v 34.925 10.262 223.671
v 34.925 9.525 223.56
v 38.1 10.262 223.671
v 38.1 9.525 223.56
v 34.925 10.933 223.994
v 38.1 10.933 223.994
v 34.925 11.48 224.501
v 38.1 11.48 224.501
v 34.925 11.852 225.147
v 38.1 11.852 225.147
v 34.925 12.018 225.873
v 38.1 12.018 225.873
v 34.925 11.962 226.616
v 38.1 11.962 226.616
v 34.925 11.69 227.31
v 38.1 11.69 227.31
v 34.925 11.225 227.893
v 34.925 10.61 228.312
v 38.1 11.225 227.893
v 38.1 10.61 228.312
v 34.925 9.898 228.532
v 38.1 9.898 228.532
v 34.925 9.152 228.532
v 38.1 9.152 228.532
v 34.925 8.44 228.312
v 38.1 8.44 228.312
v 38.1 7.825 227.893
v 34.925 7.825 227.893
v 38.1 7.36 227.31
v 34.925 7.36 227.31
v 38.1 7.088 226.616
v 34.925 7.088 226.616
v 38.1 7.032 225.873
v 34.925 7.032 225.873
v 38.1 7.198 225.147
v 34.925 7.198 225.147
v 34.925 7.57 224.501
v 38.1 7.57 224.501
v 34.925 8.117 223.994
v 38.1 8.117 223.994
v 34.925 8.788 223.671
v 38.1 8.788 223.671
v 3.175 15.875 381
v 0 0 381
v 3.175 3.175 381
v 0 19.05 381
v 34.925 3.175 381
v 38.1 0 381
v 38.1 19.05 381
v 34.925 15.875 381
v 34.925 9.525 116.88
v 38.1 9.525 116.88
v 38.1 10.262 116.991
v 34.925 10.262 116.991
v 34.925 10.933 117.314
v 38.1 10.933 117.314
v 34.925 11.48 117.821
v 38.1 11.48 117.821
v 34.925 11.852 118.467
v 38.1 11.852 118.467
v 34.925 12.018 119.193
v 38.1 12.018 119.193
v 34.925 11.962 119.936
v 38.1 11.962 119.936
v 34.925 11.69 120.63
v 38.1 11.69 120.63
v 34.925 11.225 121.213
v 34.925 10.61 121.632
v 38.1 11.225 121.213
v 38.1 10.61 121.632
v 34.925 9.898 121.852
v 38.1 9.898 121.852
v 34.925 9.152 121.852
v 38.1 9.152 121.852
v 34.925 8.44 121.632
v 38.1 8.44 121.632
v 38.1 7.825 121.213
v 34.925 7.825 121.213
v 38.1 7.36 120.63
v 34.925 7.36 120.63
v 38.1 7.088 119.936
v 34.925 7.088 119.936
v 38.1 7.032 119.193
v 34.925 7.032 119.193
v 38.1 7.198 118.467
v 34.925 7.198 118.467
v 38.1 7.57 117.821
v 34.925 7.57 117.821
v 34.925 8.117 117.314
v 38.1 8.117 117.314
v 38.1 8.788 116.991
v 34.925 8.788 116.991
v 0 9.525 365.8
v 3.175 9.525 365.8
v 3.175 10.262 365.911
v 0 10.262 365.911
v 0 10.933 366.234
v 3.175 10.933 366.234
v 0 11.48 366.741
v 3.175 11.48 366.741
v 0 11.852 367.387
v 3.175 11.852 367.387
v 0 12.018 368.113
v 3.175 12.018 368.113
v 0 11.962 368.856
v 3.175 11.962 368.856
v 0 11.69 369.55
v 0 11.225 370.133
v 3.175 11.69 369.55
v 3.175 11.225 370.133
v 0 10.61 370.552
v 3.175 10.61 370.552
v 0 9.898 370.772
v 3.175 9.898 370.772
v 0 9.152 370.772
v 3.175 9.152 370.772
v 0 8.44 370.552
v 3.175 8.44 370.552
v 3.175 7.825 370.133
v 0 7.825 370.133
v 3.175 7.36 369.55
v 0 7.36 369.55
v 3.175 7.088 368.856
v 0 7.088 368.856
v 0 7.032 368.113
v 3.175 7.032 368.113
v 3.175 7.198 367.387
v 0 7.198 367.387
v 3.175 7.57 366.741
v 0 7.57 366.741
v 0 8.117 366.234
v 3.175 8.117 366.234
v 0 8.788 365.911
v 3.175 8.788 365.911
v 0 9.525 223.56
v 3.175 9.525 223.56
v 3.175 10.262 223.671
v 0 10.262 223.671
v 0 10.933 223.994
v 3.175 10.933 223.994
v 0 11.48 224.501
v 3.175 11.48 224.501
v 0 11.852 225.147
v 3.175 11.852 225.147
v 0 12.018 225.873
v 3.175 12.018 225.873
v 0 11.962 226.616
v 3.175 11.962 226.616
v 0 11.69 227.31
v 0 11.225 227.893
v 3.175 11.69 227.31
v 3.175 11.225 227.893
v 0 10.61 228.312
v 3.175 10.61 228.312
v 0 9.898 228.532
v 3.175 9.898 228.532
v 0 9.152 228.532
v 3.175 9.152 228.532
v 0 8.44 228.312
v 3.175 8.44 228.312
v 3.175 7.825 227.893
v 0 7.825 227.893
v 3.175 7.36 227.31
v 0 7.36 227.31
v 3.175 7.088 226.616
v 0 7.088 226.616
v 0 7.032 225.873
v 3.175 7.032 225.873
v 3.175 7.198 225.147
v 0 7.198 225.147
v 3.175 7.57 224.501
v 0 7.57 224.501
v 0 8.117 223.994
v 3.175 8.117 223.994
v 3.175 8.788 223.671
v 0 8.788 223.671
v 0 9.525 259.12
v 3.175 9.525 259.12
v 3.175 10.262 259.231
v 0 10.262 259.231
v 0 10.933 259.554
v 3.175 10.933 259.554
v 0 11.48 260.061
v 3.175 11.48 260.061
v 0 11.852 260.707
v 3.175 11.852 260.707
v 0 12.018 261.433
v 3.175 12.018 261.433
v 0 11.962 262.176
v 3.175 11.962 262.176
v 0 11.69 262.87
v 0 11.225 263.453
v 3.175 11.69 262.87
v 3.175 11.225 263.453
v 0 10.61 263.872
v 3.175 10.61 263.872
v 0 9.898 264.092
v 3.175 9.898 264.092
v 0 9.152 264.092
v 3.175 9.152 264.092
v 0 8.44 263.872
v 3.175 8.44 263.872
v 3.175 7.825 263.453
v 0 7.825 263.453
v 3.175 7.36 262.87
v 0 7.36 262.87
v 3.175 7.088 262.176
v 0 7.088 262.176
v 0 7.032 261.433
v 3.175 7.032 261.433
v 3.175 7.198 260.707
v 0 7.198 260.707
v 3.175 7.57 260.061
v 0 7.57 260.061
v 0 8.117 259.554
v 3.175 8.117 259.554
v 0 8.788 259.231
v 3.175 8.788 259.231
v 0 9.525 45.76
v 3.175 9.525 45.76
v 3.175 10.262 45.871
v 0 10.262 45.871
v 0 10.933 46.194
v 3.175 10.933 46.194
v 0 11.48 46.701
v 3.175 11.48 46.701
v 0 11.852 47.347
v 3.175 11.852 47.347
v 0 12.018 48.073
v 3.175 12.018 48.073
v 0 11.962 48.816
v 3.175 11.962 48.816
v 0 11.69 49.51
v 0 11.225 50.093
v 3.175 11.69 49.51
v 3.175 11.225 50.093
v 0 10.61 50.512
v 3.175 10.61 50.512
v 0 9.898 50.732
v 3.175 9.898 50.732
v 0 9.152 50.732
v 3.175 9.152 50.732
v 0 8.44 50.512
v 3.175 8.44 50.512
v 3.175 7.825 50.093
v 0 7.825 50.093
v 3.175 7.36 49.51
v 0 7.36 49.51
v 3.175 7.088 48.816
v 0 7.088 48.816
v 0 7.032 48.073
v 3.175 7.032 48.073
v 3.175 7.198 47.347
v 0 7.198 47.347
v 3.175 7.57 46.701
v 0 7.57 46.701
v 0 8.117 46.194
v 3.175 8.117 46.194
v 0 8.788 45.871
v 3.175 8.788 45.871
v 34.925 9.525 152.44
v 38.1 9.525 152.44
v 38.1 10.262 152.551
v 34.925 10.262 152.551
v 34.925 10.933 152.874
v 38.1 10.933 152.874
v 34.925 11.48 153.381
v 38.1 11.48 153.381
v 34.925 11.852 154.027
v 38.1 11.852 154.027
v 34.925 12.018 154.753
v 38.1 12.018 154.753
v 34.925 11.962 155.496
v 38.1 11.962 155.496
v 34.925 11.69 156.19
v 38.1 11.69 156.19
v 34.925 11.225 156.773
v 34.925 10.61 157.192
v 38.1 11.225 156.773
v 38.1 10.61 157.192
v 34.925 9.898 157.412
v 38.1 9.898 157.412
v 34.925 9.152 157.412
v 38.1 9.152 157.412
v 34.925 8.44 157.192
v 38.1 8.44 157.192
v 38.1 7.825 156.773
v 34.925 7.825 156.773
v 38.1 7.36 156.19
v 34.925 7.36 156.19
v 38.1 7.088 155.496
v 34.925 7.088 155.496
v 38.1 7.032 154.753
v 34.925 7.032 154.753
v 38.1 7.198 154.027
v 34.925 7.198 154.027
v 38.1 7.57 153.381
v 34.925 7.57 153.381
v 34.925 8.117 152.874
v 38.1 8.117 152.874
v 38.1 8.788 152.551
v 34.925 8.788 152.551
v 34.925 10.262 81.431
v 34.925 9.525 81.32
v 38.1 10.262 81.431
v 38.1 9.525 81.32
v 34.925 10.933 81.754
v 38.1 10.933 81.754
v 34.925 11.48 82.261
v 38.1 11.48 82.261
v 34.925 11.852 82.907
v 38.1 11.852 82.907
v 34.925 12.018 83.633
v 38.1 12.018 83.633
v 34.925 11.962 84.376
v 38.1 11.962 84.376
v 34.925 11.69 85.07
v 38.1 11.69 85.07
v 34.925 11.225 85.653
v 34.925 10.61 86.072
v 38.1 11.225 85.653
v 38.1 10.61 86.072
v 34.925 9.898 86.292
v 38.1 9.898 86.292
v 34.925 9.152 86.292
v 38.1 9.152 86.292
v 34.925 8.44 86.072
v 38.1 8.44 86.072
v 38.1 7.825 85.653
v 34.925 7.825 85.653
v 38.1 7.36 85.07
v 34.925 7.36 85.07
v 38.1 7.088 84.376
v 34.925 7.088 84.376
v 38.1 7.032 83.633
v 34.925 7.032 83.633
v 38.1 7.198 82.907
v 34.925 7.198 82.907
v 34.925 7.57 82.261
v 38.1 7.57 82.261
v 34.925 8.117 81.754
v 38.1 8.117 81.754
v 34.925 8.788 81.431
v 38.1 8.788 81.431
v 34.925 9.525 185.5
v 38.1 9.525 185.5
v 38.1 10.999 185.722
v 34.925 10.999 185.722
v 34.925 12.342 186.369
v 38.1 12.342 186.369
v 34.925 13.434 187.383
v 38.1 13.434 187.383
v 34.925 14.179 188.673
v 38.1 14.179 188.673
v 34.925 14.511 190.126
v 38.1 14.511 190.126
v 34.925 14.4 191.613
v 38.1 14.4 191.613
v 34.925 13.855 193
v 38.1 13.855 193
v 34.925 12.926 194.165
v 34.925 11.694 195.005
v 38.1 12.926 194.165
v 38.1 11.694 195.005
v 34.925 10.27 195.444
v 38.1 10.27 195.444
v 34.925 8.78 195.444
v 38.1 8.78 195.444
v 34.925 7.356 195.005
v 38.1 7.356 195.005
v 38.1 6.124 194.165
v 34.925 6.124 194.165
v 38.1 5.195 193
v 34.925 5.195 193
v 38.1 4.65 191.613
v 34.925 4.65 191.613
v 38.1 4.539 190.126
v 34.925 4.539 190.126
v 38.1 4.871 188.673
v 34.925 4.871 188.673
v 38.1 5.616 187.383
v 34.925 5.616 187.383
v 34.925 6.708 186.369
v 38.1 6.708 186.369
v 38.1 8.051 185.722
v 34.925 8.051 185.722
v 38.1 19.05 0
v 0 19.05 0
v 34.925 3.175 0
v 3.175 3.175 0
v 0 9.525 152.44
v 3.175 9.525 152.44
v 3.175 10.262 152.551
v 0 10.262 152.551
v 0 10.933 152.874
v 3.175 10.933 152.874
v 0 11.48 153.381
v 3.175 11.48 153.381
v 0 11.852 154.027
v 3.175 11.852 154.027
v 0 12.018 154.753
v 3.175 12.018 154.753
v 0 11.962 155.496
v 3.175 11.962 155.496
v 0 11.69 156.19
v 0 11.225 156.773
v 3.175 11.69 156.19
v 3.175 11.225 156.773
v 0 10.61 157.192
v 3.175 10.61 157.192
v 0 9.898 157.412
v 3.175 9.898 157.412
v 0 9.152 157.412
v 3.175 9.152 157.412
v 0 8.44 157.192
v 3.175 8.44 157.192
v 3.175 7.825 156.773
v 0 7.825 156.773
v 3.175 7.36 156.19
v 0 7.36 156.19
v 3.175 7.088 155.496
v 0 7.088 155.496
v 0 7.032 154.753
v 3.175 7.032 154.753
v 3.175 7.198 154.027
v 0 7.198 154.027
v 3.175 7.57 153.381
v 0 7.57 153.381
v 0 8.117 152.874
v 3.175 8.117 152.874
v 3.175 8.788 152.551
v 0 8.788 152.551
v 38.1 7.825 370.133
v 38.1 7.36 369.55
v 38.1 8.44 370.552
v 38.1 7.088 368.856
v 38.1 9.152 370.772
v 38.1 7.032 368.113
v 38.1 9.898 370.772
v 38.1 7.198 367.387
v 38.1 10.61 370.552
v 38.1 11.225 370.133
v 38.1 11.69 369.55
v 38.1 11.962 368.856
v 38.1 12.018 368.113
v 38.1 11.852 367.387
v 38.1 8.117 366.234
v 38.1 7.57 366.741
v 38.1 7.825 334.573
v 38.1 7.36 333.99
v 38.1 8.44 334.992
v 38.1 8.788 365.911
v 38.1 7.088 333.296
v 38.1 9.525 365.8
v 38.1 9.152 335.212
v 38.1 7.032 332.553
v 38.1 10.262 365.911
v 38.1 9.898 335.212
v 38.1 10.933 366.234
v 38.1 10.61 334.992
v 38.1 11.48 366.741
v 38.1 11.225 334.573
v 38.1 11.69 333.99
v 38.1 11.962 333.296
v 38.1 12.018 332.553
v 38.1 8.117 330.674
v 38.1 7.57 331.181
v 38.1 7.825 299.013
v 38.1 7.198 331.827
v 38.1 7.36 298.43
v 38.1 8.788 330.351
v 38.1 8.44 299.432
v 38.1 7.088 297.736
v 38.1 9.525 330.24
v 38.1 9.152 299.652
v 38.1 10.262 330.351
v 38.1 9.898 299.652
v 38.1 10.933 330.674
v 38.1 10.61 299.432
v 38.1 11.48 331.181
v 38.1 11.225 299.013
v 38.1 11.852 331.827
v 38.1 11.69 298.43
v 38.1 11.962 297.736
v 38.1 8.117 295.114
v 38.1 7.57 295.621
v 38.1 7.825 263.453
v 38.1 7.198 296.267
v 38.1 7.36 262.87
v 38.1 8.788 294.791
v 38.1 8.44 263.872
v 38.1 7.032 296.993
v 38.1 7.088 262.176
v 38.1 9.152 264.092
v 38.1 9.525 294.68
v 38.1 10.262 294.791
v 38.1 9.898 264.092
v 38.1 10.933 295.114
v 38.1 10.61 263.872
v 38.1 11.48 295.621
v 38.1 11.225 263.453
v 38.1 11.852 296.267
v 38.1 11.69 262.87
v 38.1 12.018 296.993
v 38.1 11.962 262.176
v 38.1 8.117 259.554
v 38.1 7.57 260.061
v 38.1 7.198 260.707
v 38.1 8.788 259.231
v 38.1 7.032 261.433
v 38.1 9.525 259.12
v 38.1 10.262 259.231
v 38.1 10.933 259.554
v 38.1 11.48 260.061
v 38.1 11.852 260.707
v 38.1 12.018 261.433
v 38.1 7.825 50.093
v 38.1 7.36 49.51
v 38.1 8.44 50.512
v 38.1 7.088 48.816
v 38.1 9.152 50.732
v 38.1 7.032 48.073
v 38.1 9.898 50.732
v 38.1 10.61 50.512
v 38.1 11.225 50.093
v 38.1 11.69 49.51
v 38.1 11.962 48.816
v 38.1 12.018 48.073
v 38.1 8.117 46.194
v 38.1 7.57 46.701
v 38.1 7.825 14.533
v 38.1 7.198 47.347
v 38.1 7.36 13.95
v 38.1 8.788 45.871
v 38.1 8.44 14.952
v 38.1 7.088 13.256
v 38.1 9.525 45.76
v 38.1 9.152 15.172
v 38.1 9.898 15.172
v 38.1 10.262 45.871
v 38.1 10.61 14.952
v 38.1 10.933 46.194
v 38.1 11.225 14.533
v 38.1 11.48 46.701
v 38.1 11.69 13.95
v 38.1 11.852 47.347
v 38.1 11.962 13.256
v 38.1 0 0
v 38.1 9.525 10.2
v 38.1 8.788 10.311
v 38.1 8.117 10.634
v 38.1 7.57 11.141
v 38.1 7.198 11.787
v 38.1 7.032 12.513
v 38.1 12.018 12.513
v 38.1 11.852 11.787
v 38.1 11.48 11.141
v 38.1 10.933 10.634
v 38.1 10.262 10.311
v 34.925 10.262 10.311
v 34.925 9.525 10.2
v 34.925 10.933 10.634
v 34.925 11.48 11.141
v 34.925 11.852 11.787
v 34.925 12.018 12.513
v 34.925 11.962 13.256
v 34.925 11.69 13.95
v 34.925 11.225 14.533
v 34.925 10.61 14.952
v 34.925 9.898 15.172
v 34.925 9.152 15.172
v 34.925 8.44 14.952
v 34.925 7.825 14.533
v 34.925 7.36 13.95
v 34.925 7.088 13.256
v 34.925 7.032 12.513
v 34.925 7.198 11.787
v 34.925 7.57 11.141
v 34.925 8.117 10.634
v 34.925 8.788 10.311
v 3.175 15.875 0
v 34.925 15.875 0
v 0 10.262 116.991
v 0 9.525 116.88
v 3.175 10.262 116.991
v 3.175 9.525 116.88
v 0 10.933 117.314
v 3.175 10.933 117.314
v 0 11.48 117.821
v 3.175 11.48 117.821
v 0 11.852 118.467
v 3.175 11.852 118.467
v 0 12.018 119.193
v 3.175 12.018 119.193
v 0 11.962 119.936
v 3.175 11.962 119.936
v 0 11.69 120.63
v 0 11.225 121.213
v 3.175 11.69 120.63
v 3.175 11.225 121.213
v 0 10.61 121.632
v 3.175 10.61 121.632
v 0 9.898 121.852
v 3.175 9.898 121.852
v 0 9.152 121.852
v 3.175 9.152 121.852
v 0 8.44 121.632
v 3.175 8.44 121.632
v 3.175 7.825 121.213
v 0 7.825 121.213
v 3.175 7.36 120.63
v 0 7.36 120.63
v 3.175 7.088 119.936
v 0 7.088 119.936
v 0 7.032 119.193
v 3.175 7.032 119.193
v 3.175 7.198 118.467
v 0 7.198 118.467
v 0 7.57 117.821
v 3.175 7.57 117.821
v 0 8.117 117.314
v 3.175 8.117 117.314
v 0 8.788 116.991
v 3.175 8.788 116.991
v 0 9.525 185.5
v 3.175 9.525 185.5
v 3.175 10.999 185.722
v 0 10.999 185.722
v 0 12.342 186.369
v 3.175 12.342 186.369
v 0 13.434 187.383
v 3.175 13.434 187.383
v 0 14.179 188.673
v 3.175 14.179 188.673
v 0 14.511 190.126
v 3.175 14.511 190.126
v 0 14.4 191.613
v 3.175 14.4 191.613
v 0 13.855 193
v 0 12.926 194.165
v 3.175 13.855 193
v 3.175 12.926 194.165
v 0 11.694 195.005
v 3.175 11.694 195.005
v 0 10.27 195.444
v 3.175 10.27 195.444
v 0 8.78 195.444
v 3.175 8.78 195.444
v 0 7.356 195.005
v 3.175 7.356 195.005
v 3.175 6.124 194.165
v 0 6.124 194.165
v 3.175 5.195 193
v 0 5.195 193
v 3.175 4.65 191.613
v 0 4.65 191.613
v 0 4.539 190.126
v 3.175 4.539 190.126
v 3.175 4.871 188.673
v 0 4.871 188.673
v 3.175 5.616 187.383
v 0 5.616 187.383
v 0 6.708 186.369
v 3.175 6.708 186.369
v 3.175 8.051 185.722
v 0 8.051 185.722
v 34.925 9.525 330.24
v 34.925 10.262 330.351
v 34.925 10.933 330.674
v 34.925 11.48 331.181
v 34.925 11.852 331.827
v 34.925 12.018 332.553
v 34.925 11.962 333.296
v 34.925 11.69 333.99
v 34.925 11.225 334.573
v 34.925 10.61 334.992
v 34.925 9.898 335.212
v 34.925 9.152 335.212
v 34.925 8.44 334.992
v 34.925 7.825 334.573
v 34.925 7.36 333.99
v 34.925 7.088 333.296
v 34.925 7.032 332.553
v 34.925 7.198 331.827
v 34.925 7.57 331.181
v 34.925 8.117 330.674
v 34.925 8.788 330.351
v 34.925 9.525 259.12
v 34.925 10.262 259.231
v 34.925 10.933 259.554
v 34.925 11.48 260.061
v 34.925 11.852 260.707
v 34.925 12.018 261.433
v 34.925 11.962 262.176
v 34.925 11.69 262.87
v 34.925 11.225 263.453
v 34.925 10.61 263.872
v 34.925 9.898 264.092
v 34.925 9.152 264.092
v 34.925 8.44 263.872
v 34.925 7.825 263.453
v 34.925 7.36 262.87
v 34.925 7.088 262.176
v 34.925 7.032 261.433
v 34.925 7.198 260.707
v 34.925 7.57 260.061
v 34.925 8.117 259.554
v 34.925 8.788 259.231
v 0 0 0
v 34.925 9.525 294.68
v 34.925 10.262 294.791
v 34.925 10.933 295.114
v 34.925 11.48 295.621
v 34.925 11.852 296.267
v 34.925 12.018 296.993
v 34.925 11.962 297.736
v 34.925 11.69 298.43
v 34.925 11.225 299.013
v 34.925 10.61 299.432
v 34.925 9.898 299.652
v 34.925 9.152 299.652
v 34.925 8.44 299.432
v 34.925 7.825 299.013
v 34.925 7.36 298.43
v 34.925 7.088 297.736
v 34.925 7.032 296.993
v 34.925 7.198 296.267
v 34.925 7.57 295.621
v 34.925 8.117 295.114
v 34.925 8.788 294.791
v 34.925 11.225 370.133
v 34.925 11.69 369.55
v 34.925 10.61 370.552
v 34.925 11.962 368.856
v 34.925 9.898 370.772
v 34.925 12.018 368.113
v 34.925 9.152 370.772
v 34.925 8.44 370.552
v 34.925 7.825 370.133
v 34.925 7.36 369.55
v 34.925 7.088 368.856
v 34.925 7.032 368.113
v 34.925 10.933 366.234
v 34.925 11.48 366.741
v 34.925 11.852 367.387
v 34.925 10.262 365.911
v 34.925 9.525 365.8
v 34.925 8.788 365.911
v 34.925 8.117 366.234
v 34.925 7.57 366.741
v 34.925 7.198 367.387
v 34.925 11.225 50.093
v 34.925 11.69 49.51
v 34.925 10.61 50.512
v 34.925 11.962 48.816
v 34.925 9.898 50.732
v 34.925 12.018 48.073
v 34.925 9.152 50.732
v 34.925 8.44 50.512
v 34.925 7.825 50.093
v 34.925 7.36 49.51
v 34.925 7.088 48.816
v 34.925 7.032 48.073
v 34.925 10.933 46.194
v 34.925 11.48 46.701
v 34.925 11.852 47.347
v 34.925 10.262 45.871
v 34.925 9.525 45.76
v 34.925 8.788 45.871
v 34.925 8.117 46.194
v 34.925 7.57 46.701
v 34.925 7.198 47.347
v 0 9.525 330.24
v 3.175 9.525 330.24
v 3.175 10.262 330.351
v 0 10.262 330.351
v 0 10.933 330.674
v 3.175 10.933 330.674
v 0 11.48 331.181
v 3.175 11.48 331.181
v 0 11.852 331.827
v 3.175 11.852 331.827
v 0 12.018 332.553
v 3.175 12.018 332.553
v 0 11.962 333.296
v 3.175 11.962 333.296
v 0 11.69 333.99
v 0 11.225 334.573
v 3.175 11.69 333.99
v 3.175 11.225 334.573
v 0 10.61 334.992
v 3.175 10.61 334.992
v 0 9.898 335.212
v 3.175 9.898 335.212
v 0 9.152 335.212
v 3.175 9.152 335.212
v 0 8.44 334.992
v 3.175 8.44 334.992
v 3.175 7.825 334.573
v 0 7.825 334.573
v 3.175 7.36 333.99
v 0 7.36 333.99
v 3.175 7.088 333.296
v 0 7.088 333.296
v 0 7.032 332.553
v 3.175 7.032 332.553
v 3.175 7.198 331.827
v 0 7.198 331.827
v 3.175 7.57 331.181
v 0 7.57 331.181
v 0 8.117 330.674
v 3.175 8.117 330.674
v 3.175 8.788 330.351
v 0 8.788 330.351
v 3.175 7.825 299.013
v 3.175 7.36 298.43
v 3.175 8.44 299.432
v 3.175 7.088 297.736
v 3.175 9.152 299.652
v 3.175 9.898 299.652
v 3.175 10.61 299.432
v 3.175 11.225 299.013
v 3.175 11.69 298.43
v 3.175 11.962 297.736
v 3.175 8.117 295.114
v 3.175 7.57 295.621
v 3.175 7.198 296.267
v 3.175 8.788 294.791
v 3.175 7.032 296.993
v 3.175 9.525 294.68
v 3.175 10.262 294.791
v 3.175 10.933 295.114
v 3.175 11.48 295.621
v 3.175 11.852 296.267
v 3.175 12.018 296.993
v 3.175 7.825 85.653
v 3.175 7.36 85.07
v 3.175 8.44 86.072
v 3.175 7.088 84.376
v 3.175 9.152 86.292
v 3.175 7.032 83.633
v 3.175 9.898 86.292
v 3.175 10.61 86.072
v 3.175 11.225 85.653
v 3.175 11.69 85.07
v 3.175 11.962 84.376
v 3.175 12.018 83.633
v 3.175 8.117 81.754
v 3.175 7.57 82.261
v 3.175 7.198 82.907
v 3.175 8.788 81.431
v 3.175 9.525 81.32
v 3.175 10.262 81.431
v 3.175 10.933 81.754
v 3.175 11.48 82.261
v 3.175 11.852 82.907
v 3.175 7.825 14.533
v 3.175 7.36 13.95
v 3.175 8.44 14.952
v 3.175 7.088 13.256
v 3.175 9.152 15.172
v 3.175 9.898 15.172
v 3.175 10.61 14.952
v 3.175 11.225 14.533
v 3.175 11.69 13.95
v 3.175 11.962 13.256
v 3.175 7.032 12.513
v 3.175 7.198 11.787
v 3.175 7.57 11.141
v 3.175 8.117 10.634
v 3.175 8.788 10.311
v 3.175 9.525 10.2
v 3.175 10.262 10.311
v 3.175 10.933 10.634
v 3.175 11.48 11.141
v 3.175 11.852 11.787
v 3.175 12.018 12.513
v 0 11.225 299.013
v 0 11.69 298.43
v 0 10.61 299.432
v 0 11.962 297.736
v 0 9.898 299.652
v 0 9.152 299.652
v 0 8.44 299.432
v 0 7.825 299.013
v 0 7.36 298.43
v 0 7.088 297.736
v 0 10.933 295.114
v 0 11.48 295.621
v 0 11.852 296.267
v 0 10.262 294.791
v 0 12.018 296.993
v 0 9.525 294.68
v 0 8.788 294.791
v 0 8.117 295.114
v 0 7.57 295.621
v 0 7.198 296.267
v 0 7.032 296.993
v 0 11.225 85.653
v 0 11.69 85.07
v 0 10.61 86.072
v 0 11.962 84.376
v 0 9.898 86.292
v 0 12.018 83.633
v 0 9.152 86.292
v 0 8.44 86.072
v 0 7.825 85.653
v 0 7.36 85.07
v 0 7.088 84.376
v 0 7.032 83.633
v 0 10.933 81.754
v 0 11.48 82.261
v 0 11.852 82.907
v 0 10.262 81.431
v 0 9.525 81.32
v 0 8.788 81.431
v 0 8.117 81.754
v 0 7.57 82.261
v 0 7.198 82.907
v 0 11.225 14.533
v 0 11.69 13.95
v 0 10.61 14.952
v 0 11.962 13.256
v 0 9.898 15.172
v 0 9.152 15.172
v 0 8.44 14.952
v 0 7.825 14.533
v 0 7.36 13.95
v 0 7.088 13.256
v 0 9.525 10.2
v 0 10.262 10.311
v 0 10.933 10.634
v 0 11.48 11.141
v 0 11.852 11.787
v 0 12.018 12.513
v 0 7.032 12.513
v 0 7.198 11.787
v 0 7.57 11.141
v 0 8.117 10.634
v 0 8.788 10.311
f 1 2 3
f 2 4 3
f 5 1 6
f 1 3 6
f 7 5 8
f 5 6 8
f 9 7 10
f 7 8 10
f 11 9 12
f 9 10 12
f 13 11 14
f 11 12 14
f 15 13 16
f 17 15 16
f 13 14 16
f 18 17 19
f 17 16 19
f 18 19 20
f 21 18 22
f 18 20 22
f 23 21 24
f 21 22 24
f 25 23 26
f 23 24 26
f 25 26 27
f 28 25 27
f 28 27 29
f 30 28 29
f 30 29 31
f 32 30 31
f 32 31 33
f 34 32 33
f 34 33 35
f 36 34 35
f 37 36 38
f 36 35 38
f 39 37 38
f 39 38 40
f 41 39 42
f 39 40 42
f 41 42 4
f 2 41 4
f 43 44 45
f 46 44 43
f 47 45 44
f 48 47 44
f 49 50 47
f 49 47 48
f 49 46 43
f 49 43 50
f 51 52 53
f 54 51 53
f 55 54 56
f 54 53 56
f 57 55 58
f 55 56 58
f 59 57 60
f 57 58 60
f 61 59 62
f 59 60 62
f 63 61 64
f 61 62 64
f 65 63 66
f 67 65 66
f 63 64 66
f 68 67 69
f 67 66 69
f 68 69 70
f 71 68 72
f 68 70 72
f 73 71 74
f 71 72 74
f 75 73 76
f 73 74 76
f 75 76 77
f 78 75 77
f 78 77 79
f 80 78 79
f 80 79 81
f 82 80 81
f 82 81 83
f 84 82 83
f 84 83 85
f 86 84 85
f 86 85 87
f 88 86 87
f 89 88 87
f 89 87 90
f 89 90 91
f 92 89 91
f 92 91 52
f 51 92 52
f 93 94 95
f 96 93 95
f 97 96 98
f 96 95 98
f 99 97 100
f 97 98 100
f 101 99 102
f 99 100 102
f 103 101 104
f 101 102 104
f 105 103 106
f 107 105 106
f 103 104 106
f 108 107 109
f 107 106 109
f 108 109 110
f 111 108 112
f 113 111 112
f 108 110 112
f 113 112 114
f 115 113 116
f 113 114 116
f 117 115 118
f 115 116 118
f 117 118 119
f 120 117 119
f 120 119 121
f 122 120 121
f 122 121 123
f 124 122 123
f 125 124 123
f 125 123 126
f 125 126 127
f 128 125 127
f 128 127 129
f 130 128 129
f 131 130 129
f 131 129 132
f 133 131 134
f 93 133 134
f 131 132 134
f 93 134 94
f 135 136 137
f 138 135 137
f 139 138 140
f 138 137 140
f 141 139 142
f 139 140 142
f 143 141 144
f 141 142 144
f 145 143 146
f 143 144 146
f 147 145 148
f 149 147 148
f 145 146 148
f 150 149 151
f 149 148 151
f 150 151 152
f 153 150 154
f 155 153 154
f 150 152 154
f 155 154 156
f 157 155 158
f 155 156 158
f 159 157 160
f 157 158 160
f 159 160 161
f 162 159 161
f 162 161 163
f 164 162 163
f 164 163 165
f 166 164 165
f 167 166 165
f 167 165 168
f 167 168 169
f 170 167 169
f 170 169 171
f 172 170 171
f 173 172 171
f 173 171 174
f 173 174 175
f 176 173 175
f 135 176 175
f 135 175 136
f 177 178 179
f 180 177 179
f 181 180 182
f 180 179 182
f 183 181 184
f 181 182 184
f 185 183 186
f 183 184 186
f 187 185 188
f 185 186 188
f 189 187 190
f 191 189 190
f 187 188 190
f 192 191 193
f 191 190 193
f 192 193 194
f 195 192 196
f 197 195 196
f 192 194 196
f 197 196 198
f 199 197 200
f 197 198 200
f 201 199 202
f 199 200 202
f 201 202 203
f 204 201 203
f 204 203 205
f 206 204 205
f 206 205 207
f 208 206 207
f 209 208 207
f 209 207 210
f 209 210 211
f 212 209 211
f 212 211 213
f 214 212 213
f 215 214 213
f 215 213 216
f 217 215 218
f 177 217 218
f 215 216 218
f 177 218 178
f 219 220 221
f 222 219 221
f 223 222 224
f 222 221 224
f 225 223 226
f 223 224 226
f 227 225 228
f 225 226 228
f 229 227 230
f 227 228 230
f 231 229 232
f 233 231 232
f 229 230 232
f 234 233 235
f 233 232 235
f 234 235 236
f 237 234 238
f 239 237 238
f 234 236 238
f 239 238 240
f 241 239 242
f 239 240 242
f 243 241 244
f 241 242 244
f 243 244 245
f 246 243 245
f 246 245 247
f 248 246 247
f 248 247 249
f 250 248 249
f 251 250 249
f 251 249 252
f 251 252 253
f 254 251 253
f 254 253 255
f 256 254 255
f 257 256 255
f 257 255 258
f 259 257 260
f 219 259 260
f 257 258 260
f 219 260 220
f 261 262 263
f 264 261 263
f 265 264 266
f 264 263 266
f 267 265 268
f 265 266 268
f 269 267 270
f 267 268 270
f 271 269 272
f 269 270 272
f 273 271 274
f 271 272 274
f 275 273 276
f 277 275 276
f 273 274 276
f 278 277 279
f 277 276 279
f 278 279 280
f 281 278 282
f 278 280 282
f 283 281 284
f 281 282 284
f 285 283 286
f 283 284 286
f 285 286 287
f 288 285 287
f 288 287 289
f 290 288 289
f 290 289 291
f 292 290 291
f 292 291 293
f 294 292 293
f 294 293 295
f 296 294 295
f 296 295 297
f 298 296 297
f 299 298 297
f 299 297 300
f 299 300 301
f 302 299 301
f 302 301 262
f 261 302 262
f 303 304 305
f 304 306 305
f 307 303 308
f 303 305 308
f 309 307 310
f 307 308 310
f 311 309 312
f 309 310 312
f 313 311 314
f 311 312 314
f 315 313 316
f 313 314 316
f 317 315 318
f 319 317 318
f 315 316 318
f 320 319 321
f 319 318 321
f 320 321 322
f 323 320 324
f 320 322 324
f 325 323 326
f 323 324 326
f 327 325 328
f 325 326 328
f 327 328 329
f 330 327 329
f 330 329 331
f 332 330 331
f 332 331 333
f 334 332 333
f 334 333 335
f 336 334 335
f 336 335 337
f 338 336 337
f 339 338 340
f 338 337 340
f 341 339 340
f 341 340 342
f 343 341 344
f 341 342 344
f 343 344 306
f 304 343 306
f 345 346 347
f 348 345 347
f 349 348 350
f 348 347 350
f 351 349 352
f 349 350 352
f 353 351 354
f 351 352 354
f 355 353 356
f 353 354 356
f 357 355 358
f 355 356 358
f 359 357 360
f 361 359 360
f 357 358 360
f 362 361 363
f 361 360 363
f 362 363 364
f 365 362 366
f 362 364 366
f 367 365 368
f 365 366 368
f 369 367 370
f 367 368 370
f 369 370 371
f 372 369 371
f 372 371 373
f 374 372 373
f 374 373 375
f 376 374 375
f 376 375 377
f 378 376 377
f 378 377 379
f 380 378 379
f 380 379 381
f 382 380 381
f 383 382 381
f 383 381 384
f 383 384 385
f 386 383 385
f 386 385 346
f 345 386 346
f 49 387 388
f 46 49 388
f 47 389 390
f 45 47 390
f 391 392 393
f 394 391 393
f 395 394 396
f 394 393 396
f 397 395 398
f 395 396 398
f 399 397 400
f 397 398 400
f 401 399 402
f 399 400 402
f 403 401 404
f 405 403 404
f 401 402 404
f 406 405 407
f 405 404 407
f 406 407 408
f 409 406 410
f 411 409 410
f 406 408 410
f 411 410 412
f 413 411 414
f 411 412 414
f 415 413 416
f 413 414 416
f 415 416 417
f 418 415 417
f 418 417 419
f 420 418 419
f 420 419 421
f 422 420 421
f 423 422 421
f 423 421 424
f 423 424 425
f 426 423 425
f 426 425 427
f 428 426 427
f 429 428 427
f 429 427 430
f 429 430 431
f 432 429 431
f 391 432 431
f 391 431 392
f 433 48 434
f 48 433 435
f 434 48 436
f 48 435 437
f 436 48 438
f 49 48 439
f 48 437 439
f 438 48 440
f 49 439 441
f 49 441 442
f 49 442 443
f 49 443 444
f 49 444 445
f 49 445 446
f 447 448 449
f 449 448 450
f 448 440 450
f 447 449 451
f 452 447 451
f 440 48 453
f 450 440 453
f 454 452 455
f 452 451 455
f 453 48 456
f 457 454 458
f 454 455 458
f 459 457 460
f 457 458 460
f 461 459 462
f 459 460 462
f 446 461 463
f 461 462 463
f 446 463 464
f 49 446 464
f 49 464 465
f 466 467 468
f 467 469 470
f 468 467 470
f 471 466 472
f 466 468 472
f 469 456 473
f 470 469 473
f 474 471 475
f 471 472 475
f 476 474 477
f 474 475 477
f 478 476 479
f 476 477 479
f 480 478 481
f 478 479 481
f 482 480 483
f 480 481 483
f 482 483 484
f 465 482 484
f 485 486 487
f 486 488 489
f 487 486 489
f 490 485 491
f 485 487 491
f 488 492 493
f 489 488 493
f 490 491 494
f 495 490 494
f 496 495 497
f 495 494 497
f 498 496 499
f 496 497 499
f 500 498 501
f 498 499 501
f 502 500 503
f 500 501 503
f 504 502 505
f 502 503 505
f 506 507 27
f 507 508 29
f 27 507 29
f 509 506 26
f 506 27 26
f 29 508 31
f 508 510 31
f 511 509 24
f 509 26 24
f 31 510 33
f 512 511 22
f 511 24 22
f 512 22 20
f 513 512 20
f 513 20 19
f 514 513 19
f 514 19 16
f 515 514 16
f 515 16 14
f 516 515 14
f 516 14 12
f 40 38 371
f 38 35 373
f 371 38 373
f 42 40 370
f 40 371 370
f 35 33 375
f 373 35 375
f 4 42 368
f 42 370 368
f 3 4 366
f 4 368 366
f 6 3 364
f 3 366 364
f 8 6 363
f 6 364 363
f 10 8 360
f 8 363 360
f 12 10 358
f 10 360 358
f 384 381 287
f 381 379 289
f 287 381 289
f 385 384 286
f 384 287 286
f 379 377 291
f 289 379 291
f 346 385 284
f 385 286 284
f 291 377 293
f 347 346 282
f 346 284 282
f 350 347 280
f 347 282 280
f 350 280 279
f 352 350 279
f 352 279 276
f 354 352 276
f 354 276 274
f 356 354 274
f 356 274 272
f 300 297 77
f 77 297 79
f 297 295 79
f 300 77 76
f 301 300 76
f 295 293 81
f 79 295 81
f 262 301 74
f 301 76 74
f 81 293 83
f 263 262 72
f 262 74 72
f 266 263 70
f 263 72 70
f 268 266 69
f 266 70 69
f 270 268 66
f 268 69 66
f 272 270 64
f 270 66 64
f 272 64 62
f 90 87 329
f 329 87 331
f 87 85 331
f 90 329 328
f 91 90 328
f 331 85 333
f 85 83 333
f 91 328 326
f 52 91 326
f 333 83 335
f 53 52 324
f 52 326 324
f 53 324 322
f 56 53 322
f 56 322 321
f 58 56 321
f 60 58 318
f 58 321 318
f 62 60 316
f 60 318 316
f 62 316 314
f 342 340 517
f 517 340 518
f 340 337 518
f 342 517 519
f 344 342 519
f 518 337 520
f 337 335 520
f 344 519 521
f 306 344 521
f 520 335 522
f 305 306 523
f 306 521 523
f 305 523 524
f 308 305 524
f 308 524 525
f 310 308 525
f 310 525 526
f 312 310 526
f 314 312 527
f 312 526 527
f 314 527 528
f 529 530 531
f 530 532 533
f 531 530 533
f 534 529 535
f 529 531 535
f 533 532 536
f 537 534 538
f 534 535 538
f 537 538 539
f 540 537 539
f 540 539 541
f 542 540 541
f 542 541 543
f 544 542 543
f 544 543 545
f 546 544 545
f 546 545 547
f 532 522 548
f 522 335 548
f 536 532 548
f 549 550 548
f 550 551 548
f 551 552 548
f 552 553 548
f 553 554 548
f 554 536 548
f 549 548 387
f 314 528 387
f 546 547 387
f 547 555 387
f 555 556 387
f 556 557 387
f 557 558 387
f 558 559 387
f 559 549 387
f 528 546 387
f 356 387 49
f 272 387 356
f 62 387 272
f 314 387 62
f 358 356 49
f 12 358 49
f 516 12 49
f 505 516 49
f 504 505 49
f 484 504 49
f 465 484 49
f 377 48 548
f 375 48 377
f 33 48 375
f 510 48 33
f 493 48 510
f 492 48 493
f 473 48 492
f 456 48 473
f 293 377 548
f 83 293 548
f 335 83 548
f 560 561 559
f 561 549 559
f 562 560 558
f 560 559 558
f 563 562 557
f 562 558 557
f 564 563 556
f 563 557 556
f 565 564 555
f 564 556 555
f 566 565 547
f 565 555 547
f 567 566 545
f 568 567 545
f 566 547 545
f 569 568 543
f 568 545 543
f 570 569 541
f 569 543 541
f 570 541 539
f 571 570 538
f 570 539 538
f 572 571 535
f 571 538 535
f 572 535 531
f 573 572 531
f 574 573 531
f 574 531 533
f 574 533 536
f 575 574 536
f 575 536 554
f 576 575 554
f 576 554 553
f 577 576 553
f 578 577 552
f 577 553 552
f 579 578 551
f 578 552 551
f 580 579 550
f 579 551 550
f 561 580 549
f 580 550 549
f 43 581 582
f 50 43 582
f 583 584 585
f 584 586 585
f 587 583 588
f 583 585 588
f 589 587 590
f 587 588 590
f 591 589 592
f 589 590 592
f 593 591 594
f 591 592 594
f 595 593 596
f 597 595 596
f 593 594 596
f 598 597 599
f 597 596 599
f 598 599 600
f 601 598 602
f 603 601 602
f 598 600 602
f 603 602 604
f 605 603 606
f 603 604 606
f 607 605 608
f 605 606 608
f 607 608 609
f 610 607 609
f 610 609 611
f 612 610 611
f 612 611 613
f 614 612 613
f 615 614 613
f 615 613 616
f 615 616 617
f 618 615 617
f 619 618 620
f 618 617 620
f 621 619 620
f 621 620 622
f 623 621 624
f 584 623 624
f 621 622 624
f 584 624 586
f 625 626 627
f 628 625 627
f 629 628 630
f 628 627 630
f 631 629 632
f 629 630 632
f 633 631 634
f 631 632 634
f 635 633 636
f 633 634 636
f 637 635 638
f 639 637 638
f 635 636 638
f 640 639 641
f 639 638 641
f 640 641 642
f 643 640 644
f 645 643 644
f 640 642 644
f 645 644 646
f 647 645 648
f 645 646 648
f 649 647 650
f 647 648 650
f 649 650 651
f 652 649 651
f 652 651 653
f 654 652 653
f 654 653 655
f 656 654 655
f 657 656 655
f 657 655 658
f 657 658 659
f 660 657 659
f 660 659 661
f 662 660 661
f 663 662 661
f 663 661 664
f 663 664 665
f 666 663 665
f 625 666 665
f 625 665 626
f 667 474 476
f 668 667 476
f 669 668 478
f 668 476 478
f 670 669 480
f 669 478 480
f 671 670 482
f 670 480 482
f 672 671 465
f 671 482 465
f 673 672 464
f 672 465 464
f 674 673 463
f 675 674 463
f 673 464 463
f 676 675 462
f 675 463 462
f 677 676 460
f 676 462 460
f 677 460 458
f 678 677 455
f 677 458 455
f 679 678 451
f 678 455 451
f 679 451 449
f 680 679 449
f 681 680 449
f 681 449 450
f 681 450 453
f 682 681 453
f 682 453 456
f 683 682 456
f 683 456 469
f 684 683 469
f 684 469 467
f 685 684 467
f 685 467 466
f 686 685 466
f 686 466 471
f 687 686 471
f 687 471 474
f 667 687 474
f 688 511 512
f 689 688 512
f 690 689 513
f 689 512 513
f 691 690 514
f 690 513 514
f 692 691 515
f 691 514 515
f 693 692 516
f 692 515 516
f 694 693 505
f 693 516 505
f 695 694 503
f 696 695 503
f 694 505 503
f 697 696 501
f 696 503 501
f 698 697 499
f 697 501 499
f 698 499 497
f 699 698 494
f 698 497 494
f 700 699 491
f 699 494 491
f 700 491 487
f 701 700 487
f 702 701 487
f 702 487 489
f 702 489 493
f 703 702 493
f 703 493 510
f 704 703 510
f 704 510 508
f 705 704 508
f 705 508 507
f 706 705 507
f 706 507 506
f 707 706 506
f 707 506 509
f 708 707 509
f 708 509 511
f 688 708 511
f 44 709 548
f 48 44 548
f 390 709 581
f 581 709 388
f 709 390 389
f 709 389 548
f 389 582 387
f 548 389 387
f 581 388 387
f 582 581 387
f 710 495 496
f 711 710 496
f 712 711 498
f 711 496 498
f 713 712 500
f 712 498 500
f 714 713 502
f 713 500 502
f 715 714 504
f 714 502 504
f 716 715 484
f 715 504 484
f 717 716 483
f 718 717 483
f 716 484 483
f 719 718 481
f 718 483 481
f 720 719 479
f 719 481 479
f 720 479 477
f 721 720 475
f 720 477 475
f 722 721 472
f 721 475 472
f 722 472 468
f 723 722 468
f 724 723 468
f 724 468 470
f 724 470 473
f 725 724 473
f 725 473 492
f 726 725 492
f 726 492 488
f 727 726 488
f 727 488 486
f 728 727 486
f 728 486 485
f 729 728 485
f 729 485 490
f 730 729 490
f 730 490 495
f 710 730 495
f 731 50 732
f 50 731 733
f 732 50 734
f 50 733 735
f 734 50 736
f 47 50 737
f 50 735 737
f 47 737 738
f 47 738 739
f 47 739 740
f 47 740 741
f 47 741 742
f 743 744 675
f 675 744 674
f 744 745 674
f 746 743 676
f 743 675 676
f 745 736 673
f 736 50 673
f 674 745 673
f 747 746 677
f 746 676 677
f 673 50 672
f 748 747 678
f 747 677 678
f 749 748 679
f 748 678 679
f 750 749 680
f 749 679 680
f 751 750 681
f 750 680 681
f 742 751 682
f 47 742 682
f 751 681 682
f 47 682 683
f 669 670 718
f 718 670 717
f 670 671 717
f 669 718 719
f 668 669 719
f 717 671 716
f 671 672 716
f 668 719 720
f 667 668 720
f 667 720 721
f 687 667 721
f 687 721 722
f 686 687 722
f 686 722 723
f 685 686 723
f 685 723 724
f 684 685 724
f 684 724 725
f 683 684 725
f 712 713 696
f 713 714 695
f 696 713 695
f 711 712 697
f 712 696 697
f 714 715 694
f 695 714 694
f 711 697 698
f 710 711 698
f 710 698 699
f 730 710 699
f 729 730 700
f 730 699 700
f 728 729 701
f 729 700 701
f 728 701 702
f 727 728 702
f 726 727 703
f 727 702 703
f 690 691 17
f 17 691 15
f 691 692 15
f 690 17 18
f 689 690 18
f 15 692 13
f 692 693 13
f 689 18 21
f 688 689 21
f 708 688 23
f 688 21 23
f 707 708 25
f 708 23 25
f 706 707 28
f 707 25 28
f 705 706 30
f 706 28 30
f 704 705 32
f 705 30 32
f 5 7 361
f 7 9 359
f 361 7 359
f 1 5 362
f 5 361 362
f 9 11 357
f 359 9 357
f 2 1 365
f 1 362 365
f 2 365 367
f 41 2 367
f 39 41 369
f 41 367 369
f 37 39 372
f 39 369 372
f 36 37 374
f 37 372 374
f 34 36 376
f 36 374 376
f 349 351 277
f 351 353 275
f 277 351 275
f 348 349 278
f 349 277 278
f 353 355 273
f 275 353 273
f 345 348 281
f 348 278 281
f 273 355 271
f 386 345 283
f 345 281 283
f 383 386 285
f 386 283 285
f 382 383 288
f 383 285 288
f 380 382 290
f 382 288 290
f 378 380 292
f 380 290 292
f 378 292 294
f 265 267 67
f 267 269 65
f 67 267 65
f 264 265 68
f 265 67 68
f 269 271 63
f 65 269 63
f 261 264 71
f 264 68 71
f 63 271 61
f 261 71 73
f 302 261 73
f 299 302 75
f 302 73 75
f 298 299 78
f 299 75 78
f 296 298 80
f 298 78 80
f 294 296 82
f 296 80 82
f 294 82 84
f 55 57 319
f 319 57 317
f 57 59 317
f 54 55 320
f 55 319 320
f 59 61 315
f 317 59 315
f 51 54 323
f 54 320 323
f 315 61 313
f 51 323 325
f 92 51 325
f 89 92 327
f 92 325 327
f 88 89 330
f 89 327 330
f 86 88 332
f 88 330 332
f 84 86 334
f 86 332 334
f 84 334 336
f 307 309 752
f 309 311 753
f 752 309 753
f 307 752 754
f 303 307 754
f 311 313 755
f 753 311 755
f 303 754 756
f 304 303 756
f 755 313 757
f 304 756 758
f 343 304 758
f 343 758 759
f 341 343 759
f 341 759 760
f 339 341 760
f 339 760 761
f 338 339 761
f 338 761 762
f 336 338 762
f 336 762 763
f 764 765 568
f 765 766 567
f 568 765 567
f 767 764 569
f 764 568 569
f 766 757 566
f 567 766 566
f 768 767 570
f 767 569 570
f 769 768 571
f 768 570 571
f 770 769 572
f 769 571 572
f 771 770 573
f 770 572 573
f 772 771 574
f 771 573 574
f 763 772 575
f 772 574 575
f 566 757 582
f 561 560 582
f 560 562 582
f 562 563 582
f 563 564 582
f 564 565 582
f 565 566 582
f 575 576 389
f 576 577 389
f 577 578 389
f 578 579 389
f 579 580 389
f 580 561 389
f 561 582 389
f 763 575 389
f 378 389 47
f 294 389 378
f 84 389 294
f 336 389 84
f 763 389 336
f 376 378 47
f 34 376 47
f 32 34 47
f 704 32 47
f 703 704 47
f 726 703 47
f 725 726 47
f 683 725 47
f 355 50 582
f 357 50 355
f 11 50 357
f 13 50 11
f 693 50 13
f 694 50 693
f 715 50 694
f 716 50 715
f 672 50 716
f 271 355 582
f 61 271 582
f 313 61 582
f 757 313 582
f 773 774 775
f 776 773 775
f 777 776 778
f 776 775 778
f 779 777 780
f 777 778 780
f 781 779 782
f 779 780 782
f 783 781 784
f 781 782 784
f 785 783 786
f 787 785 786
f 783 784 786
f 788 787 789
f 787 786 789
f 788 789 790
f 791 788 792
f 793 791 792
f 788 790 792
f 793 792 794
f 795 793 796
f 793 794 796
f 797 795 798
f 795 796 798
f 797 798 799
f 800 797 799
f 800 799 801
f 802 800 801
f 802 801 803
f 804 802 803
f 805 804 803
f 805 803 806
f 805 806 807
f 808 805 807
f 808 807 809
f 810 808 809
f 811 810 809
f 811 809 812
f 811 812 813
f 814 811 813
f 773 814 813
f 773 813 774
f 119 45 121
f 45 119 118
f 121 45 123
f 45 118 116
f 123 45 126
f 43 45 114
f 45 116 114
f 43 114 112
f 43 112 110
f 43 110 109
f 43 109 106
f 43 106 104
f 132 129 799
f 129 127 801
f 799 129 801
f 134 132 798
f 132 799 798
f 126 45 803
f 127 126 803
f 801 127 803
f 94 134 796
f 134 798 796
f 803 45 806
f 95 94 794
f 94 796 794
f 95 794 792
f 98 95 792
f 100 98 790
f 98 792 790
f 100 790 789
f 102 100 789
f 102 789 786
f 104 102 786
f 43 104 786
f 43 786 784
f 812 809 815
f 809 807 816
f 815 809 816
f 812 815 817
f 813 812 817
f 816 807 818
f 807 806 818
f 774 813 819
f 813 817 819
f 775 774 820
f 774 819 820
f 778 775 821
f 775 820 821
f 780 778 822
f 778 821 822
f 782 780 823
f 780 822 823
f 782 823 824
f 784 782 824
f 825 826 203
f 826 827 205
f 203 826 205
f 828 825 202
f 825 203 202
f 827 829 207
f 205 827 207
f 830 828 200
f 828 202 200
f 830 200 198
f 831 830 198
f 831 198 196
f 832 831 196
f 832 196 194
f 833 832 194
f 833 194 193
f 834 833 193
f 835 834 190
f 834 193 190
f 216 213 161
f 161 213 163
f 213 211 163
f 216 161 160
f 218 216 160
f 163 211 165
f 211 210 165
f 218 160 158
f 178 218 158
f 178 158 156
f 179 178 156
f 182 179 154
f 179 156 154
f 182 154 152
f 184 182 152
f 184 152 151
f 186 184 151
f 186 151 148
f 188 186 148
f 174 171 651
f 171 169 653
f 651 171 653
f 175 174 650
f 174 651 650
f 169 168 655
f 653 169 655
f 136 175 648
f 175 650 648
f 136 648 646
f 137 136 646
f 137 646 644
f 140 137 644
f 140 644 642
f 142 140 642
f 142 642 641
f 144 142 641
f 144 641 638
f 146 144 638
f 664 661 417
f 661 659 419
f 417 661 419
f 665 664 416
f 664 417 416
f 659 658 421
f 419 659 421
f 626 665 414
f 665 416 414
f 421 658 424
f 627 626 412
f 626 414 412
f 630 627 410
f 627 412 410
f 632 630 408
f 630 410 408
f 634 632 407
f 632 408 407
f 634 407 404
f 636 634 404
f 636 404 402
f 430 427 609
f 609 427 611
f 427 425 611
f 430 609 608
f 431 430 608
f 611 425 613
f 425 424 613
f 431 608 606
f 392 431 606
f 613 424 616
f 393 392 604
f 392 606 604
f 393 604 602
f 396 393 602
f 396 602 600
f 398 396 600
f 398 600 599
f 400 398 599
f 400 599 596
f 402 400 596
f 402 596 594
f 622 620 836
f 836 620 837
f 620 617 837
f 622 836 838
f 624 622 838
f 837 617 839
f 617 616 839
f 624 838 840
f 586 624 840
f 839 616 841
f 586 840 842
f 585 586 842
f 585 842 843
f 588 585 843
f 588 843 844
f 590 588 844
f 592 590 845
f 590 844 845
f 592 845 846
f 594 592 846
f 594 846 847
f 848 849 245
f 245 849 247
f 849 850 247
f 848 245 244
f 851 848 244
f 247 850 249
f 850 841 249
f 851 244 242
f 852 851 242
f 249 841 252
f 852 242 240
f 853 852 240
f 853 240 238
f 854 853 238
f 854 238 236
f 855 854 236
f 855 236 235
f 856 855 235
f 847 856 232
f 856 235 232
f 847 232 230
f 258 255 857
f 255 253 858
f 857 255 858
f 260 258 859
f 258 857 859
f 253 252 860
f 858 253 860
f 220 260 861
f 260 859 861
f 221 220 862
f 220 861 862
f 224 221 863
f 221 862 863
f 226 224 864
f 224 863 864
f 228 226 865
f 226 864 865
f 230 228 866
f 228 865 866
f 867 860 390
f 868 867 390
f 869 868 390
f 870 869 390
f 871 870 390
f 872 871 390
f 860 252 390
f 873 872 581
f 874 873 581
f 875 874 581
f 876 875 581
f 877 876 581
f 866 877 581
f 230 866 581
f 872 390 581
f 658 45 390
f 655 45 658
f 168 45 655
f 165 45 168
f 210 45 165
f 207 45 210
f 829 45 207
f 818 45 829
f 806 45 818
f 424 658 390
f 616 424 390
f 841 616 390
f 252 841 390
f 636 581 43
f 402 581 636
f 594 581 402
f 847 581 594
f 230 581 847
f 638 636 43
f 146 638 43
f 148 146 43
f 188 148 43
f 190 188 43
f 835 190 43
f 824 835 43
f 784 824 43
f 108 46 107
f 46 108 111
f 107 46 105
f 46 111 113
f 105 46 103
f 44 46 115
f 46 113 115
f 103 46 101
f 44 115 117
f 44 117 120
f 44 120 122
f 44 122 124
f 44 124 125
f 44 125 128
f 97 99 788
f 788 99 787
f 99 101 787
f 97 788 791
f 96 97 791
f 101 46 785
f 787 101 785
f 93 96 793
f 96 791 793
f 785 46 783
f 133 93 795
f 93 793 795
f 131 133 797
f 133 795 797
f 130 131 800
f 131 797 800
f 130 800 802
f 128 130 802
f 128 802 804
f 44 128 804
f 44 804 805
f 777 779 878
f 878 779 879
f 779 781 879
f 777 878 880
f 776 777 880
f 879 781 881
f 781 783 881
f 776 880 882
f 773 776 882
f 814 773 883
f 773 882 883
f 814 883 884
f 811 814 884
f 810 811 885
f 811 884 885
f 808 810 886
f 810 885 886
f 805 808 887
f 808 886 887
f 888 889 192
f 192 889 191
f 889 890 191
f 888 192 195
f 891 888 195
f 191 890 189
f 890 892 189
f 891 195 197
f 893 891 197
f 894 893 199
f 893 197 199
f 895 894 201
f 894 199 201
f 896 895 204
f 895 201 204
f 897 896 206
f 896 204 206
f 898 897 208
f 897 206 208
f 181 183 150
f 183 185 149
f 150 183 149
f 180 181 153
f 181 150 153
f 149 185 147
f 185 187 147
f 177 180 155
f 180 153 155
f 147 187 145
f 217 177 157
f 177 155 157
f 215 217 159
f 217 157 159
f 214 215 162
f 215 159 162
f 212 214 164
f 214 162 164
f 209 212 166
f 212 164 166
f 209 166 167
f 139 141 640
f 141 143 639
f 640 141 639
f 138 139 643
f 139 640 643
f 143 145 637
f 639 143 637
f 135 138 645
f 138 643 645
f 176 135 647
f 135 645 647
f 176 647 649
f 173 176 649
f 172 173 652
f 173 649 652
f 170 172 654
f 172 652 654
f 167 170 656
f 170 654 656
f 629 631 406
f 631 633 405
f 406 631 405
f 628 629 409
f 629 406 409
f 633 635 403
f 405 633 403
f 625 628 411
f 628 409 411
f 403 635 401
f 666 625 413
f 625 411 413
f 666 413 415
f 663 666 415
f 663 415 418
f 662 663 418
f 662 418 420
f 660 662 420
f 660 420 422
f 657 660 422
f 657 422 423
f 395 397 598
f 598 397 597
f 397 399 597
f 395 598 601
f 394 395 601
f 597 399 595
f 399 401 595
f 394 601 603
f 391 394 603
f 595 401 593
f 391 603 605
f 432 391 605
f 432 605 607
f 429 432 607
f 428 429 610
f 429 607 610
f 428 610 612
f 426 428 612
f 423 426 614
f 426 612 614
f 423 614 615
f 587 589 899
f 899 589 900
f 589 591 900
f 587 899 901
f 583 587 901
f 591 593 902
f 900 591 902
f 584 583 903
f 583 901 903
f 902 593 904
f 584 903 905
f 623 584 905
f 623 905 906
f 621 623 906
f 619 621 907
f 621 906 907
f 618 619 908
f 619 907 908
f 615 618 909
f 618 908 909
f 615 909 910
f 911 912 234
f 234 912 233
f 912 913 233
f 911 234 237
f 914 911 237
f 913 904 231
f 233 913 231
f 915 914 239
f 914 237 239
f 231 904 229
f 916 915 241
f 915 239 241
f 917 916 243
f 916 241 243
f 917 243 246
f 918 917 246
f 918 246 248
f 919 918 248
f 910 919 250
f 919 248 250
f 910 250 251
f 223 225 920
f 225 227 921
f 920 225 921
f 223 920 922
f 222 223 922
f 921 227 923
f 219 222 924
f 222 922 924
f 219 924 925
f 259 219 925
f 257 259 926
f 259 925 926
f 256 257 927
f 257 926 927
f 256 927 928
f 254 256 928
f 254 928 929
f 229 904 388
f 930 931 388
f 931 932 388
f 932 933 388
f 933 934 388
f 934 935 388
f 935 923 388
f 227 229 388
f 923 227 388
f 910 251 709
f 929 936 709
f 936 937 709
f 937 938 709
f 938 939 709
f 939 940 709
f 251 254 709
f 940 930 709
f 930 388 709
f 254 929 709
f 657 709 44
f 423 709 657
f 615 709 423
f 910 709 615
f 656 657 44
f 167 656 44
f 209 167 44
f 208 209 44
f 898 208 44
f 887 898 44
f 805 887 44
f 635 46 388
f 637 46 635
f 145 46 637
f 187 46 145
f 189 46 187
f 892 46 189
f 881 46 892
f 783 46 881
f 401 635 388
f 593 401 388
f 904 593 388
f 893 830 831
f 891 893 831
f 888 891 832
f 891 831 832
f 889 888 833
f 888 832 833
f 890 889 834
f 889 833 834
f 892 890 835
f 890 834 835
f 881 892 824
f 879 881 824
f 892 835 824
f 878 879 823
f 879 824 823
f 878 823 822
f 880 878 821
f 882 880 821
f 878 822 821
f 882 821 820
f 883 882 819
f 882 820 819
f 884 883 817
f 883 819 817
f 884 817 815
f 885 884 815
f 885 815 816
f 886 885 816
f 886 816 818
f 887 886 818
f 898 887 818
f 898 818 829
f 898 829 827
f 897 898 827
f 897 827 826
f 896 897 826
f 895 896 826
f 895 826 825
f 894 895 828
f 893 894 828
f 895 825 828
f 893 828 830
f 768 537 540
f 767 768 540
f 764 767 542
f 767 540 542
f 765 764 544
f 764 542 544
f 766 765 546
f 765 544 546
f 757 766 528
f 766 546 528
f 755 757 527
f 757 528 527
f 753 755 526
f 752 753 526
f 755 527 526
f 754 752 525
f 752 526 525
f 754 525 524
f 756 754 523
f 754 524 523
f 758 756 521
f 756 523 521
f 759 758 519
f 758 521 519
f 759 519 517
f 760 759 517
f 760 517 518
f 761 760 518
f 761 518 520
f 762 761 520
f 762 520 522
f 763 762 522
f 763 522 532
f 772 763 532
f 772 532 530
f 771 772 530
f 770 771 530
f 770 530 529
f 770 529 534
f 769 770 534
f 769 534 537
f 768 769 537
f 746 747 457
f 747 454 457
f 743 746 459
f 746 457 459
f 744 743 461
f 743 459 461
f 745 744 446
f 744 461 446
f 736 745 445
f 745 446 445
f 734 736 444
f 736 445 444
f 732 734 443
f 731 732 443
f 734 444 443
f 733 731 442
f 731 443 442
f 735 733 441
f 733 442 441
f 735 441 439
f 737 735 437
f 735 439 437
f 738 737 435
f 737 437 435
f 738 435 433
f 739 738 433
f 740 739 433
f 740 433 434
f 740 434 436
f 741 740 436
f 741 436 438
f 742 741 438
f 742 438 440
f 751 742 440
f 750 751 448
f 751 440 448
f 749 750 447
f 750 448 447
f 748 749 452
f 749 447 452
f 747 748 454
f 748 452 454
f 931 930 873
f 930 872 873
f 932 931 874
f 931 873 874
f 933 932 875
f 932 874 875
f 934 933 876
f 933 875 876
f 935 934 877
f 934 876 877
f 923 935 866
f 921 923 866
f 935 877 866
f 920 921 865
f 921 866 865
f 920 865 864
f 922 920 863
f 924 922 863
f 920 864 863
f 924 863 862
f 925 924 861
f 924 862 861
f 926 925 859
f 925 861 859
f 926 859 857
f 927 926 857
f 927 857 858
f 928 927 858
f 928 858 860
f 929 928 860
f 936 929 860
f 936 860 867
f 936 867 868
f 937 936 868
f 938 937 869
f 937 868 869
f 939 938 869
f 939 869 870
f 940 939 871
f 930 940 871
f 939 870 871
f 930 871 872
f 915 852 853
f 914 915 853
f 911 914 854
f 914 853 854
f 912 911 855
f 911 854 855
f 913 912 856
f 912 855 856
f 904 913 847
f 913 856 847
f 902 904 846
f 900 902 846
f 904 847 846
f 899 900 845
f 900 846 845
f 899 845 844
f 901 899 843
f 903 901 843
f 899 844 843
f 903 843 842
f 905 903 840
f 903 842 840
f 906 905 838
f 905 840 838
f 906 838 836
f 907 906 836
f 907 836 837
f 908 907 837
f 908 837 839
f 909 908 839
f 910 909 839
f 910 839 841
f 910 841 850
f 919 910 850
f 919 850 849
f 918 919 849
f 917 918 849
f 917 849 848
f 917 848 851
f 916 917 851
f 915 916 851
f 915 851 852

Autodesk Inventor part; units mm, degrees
ref_plane "YZ Plane" through (0, 0, 0) normal (1, 0, 0) x (0, 1, 0)
ref_plane "XZ Plane" through (0, 0, 0) normal (0, 1, 0) x (-1, 0, 0)
ref_plane "XY Plane" through (0, 0, 0) normal (0, 0, 1) x (1, 0, 0)
sketch "Sketch1" plane through (0, 0, 0) normal (0, 0, 1) x (1, 0, 0)
  line L0 (0, 0) -> (38.1, 0)
  line L1 (38.1, 0) -> (38.1, 19.05)
  line L2 (38.1, 19.05) -> (0, 19.05)
  line L3 (0, 19.05) -> (0, 0)
  line L4 (3.175, 15.875) -> (34.925, 15.875)
  line L5 (34.925, 15.875) -> (34.925, 3.175)
  line L6 (34.925, 3.175) -> (3.175, 3.175)
  line L7 (3.175, 3.175) -> (3.175, 15.875)
  dimension "d0" = 38.1
  dimension "d1" = 19.05
  dimension "d2" = 3.175
extrude "Extrusion1" add sketch "Sketch1" along normal blind 381
sketch "Sketch2" plane through (38.1, 0, 0) normal (1, 0, 0) x (0, 0, -1)
  circle A0 centre (-190.5, 9.525) radius 5
  line L0 (0, 19.05) -> (-381, 19.05) projected
  line L1 (-381, 0) -> (-381, 19.05) projected
  point P0 (0, 0)
  point P1 (-381, 9.525)
  dimension "d5" = 10
  dimension "d6" = 9.525
  dimension "d7" = 190.5
extrude "Extrusion2" cut sketch "Sketch2" against normal blind 381
sketch "Sketch4" plane through (38.1, 0, 0) normal (1, 0, 0) x (0, 0, -1)
  line L0 (-381, 0) -> (-381, 19.05) projected
  line L1 (-381, 9.525) -> (-254, 9.525)
  circle A0 centre (-368.3, 9.525) radius 2.5
  circle A1 centre (-332.74, 9.525) radius 2.5
  circle A2 centre (-297.18, 9.525) radius 2.5
  circle A3 centre (-261.62, 9.525) radius 2.5
  circle A4 centre (-226.06, 9.525) radius 2.5
  line L2 (0, 0) -> (0, 19.05) projected
  line L3 (0, 9.525) -> (-40.9904, 9.525)
  circle A5 centre (-12.7, 9.525) radius 2.5
  circle A6 centre (-48.26, 9.525) radius 2.5
  circle A7 centre (-83.82, 9.525) radius 2.5
  circle A8 centre (-119.38, 9.525) radius 2.5
  circle A9 centre (-154.94, 9.525) radius 2.5
  dimension "d10" = 127
  dimension "d11" = 5
  dimension "d14" = 35.56
  dimension "d19" = 12.7
  dimension "d20" = 5
  dimension "d23" = 35.56
  dimension "d28" = 12.7
extrude "Extrusion3" cut sketch "Sketch4" against normal blind 381
properties part number "hinge aray side"
